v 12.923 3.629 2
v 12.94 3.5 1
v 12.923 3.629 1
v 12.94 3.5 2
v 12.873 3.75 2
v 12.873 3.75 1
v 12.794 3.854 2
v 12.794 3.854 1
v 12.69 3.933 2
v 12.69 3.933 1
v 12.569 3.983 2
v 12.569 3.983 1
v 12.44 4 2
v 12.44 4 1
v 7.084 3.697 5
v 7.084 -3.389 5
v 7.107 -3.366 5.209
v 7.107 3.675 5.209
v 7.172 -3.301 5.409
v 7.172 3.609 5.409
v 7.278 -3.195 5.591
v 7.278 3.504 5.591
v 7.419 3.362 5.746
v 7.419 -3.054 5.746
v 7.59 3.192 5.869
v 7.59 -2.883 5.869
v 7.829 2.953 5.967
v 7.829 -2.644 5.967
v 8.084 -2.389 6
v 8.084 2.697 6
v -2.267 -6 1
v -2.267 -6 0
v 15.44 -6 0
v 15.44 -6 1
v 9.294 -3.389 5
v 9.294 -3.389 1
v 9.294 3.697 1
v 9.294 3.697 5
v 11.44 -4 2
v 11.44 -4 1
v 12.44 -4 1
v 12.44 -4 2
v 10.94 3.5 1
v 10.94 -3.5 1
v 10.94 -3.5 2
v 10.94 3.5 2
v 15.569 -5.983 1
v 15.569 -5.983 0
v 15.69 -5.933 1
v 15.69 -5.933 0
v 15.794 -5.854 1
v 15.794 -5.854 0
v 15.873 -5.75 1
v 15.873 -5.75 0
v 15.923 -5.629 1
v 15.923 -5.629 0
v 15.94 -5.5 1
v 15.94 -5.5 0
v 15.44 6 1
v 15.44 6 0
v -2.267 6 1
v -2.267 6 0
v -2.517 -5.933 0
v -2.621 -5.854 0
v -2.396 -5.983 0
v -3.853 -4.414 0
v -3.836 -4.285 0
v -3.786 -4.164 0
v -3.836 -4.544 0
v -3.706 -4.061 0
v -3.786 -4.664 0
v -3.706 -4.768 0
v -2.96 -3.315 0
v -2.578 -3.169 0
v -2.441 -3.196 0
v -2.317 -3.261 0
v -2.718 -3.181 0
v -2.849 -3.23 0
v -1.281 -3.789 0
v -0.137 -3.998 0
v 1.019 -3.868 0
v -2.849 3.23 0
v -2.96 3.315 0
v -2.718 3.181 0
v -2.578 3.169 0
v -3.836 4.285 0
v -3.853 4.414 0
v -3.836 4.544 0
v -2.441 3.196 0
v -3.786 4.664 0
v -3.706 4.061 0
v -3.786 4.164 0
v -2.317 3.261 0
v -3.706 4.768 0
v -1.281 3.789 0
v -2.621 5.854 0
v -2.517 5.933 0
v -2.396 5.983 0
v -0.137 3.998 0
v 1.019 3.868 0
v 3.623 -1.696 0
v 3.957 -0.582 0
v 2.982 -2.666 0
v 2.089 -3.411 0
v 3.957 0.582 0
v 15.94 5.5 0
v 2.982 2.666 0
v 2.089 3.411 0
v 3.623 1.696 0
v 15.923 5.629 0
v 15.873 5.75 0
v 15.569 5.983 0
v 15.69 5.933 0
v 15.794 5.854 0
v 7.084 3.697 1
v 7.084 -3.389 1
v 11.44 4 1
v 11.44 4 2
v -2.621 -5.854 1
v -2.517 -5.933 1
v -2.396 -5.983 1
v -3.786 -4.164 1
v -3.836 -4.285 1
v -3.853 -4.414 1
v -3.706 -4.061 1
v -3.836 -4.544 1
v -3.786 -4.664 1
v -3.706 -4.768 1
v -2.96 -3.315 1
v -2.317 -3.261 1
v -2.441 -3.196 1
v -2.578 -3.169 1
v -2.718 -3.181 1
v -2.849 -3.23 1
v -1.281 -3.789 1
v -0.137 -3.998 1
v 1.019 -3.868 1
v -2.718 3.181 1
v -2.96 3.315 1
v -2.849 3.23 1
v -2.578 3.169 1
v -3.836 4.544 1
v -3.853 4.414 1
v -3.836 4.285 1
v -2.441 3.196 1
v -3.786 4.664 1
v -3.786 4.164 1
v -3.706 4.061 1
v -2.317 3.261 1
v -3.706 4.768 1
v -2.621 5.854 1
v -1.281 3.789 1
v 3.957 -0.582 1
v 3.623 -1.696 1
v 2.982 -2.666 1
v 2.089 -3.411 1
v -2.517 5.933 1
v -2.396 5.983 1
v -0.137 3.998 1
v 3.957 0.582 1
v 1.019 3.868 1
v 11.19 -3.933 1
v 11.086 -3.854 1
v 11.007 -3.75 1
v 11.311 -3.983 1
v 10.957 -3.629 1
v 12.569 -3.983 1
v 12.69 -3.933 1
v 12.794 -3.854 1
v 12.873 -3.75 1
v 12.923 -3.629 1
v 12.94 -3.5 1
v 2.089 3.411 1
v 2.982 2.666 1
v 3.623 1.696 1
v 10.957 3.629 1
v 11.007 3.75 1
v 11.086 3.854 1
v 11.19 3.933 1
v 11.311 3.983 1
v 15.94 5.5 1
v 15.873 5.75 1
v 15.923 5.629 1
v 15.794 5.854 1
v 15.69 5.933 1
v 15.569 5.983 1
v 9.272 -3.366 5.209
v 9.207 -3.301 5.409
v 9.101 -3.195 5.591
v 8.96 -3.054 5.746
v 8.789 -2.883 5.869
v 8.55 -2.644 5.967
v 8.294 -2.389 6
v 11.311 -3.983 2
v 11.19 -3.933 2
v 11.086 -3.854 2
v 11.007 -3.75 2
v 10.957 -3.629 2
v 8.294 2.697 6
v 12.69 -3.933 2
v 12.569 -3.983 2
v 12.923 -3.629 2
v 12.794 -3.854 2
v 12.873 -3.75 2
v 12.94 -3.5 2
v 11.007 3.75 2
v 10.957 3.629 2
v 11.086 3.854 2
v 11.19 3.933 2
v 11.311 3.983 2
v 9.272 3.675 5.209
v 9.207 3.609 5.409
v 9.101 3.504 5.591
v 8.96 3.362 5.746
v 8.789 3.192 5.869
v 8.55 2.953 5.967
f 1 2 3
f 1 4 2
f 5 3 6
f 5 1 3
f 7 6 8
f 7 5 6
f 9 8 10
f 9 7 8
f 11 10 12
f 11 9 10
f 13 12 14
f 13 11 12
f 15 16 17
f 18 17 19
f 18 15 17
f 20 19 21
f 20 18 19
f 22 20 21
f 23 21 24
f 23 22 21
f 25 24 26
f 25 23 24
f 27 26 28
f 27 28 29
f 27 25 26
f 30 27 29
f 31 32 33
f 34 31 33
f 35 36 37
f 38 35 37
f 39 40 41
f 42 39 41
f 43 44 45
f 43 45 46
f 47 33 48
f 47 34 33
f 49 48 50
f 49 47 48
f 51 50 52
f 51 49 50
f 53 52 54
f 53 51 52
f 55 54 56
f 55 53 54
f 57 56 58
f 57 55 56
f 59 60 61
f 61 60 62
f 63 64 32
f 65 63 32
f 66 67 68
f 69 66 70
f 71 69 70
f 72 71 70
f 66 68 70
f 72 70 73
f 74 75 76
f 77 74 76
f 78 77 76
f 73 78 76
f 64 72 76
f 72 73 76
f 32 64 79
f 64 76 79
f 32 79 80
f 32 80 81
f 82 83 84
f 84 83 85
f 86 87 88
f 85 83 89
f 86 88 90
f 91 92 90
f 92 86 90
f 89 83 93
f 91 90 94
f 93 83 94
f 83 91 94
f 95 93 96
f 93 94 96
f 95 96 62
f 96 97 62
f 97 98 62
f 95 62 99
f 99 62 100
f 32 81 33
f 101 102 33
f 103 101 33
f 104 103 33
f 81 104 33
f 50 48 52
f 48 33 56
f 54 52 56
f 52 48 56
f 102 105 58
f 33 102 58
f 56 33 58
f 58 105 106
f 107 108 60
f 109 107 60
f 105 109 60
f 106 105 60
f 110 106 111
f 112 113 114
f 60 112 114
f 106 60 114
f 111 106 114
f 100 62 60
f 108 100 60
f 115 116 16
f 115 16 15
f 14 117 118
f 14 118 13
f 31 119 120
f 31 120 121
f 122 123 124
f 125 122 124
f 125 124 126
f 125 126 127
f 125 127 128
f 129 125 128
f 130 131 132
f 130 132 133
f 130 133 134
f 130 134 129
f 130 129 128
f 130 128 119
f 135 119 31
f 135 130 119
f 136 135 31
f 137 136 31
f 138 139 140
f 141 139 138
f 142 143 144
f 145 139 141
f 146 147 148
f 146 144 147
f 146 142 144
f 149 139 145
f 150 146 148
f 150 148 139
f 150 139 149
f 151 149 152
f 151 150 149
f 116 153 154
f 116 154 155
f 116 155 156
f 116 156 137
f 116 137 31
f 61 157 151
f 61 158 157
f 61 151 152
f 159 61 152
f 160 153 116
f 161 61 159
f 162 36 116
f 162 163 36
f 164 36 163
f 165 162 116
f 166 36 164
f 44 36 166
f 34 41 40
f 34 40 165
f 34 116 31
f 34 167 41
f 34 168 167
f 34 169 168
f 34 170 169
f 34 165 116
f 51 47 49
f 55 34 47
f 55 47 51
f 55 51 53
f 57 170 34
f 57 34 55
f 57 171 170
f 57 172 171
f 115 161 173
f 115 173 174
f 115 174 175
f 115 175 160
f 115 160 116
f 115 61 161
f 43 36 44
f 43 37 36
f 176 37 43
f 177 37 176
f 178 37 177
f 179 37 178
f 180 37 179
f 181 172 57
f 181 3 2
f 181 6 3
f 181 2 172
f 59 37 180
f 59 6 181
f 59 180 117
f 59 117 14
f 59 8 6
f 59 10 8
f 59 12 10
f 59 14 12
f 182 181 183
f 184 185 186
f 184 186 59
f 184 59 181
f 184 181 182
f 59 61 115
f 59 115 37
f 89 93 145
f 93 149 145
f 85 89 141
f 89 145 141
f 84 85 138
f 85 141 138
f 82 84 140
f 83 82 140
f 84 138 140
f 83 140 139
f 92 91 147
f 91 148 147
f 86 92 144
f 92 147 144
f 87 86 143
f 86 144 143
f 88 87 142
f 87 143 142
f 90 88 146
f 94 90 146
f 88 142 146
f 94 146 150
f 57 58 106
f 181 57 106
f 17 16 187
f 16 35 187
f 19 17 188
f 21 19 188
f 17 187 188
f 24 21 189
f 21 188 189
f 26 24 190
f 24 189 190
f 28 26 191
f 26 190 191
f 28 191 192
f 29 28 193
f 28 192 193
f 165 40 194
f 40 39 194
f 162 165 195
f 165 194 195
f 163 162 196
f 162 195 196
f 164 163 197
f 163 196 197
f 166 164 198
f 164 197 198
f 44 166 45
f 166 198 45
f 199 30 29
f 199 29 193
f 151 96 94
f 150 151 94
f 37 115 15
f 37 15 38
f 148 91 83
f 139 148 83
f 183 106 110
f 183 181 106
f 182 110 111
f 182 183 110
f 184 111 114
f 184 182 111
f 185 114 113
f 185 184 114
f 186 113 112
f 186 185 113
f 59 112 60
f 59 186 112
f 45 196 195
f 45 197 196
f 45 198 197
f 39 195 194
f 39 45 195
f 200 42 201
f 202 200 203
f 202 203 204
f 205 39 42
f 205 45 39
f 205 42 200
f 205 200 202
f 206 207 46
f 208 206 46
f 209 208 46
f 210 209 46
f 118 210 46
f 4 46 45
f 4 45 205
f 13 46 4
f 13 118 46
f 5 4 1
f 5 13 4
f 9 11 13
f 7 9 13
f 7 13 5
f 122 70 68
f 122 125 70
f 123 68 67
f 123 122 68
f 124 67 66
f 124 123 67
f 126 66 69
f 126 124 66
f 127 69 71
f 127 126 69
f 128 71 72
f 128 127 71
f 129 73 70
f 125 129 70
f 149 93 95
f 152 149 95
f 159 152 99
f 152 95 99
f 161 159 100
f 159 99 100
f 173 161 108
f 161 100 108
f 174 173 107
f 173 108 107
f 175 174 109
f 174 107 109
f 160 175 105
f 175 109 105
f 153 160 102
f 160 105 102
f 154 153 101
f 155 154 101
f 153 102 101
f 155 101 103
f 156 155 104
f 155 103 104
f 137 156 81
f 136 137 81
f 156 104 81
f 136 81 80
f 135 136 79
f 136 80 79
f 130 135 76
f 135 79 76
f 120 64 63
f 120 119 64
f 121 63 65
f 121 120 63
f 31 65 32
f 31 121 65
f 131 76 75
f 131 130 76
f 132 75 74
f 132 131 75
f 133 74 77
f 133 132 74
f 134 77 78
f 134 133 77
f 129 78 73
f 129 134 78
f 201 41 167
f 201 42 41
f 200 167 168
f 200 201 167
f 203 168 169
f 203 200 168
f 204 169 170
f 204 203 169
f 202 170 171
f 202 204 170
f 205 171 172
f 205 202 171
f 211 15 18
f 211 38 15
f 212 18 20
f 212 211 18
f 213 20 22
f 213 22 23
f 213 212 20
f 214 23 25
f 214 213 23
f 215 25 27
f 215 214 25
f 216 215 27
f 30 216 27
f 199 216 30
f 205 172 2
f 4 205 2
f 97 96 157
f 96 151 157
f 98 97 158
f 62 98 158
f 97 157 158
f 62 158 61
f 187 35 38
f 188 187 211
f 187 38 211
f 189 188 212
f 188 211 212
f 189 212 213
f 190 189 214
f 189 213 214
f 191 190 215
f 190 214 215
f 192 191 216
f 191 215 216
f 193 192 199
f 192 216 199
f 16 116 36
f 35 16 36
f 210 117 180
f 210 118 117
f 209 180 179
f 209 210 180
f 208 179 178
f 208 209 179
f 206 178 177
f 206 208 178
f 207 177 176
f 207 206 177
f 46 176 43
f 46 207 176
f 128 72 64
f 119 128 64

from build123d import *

# Parameters (mm, degrees)
F1_DEPTH = 1
F2_W     = 2
F2_H     = 8
F3_DEPTH = 1
F4_R     = 0.5
F5_W     = 2.2095986642
F5_H     = 7.0855088998
F6_DEPTH = 5
F7_R     = 1


with BuildPart() as f1:
    # F0 (on Top) → F1 (new body)
    with BuildSketch(Plane.XY):
        with BuildLine():
            ThreePointArc((-2.6457513111, 3), (4, 0), (-2.6457513111, -3))
            Line((-2.6457513111, -3), (-4.0599648734, -4.4142135624))
            Line((-4.0599648734, -4.4142135624), (-2.4741784358, -6))
            Line((-2.4741784358, -6), (15.9400351266, -6))
            Line((15.9400351266, -6), (15.9400351266, 6))
            Line((15.9400351266, 6), (-2.4741784358, 6))
            Line((-2.4741784358, 6), (-4.0599648734, 4.4142135624))
            Line((-4.0599648734, 4.4142135624), (-2.6457513111, 3))
        make_face()
    extrude(amount=F1_DEPTH)

    # F2 (on face) → F3 (join)
    with BuildSketch(Plane.XY.offset(1)):
        with Locations((11.9400351266, 0)):
            Rectangle(F2_W, F2_H)
    extrude(amount=F3_DEPTH)

    # F4
    f4_edges = [f1.edges().sort_by_distance(p)[0] for p in [
        (-2.645751, -3, 0.5),
        (-2.645751, 3, 0.5),
        (-4.059965, -4.414214, 0.5),
        (-2.474178, -6, 0.5),
        (-4.059965, 4.414214, 0.5),
        (-2.474178, 6, 0.5),
        (10.940035, -4, 1.5),
        (12.940035, -4, 1.5),
        (10.940035, 4, 1.5),
        (12.940035, 4, 1.5),
        (15.940035, 6, 0.5),
        (15.940035, -6, 0.5),
    ]]
    fillet(f4_edges, radius=F4_R)

    # F5 (on face) → F6 (join)
    with BuildSketch(Plane.XY.offset(1)):
        with Locations((8.1892169546, 0.1541808015)):
            Rectangle(F5_W, F5_H)
    extrude(amount=F6_DEPTH)

    # F7
    f7_edges = [f1.edges().sort_by_distance(p)[0] for p in [
        (8.189217, 3.696935, 6),
        (7.084418, 0.154181, 6),
        (8.189217, -3.388574, 6),
        (9.294016, 0.154181, 6),
    ]]
    fillet(f7_edges, radius=F7_R)


solid = f1.part
